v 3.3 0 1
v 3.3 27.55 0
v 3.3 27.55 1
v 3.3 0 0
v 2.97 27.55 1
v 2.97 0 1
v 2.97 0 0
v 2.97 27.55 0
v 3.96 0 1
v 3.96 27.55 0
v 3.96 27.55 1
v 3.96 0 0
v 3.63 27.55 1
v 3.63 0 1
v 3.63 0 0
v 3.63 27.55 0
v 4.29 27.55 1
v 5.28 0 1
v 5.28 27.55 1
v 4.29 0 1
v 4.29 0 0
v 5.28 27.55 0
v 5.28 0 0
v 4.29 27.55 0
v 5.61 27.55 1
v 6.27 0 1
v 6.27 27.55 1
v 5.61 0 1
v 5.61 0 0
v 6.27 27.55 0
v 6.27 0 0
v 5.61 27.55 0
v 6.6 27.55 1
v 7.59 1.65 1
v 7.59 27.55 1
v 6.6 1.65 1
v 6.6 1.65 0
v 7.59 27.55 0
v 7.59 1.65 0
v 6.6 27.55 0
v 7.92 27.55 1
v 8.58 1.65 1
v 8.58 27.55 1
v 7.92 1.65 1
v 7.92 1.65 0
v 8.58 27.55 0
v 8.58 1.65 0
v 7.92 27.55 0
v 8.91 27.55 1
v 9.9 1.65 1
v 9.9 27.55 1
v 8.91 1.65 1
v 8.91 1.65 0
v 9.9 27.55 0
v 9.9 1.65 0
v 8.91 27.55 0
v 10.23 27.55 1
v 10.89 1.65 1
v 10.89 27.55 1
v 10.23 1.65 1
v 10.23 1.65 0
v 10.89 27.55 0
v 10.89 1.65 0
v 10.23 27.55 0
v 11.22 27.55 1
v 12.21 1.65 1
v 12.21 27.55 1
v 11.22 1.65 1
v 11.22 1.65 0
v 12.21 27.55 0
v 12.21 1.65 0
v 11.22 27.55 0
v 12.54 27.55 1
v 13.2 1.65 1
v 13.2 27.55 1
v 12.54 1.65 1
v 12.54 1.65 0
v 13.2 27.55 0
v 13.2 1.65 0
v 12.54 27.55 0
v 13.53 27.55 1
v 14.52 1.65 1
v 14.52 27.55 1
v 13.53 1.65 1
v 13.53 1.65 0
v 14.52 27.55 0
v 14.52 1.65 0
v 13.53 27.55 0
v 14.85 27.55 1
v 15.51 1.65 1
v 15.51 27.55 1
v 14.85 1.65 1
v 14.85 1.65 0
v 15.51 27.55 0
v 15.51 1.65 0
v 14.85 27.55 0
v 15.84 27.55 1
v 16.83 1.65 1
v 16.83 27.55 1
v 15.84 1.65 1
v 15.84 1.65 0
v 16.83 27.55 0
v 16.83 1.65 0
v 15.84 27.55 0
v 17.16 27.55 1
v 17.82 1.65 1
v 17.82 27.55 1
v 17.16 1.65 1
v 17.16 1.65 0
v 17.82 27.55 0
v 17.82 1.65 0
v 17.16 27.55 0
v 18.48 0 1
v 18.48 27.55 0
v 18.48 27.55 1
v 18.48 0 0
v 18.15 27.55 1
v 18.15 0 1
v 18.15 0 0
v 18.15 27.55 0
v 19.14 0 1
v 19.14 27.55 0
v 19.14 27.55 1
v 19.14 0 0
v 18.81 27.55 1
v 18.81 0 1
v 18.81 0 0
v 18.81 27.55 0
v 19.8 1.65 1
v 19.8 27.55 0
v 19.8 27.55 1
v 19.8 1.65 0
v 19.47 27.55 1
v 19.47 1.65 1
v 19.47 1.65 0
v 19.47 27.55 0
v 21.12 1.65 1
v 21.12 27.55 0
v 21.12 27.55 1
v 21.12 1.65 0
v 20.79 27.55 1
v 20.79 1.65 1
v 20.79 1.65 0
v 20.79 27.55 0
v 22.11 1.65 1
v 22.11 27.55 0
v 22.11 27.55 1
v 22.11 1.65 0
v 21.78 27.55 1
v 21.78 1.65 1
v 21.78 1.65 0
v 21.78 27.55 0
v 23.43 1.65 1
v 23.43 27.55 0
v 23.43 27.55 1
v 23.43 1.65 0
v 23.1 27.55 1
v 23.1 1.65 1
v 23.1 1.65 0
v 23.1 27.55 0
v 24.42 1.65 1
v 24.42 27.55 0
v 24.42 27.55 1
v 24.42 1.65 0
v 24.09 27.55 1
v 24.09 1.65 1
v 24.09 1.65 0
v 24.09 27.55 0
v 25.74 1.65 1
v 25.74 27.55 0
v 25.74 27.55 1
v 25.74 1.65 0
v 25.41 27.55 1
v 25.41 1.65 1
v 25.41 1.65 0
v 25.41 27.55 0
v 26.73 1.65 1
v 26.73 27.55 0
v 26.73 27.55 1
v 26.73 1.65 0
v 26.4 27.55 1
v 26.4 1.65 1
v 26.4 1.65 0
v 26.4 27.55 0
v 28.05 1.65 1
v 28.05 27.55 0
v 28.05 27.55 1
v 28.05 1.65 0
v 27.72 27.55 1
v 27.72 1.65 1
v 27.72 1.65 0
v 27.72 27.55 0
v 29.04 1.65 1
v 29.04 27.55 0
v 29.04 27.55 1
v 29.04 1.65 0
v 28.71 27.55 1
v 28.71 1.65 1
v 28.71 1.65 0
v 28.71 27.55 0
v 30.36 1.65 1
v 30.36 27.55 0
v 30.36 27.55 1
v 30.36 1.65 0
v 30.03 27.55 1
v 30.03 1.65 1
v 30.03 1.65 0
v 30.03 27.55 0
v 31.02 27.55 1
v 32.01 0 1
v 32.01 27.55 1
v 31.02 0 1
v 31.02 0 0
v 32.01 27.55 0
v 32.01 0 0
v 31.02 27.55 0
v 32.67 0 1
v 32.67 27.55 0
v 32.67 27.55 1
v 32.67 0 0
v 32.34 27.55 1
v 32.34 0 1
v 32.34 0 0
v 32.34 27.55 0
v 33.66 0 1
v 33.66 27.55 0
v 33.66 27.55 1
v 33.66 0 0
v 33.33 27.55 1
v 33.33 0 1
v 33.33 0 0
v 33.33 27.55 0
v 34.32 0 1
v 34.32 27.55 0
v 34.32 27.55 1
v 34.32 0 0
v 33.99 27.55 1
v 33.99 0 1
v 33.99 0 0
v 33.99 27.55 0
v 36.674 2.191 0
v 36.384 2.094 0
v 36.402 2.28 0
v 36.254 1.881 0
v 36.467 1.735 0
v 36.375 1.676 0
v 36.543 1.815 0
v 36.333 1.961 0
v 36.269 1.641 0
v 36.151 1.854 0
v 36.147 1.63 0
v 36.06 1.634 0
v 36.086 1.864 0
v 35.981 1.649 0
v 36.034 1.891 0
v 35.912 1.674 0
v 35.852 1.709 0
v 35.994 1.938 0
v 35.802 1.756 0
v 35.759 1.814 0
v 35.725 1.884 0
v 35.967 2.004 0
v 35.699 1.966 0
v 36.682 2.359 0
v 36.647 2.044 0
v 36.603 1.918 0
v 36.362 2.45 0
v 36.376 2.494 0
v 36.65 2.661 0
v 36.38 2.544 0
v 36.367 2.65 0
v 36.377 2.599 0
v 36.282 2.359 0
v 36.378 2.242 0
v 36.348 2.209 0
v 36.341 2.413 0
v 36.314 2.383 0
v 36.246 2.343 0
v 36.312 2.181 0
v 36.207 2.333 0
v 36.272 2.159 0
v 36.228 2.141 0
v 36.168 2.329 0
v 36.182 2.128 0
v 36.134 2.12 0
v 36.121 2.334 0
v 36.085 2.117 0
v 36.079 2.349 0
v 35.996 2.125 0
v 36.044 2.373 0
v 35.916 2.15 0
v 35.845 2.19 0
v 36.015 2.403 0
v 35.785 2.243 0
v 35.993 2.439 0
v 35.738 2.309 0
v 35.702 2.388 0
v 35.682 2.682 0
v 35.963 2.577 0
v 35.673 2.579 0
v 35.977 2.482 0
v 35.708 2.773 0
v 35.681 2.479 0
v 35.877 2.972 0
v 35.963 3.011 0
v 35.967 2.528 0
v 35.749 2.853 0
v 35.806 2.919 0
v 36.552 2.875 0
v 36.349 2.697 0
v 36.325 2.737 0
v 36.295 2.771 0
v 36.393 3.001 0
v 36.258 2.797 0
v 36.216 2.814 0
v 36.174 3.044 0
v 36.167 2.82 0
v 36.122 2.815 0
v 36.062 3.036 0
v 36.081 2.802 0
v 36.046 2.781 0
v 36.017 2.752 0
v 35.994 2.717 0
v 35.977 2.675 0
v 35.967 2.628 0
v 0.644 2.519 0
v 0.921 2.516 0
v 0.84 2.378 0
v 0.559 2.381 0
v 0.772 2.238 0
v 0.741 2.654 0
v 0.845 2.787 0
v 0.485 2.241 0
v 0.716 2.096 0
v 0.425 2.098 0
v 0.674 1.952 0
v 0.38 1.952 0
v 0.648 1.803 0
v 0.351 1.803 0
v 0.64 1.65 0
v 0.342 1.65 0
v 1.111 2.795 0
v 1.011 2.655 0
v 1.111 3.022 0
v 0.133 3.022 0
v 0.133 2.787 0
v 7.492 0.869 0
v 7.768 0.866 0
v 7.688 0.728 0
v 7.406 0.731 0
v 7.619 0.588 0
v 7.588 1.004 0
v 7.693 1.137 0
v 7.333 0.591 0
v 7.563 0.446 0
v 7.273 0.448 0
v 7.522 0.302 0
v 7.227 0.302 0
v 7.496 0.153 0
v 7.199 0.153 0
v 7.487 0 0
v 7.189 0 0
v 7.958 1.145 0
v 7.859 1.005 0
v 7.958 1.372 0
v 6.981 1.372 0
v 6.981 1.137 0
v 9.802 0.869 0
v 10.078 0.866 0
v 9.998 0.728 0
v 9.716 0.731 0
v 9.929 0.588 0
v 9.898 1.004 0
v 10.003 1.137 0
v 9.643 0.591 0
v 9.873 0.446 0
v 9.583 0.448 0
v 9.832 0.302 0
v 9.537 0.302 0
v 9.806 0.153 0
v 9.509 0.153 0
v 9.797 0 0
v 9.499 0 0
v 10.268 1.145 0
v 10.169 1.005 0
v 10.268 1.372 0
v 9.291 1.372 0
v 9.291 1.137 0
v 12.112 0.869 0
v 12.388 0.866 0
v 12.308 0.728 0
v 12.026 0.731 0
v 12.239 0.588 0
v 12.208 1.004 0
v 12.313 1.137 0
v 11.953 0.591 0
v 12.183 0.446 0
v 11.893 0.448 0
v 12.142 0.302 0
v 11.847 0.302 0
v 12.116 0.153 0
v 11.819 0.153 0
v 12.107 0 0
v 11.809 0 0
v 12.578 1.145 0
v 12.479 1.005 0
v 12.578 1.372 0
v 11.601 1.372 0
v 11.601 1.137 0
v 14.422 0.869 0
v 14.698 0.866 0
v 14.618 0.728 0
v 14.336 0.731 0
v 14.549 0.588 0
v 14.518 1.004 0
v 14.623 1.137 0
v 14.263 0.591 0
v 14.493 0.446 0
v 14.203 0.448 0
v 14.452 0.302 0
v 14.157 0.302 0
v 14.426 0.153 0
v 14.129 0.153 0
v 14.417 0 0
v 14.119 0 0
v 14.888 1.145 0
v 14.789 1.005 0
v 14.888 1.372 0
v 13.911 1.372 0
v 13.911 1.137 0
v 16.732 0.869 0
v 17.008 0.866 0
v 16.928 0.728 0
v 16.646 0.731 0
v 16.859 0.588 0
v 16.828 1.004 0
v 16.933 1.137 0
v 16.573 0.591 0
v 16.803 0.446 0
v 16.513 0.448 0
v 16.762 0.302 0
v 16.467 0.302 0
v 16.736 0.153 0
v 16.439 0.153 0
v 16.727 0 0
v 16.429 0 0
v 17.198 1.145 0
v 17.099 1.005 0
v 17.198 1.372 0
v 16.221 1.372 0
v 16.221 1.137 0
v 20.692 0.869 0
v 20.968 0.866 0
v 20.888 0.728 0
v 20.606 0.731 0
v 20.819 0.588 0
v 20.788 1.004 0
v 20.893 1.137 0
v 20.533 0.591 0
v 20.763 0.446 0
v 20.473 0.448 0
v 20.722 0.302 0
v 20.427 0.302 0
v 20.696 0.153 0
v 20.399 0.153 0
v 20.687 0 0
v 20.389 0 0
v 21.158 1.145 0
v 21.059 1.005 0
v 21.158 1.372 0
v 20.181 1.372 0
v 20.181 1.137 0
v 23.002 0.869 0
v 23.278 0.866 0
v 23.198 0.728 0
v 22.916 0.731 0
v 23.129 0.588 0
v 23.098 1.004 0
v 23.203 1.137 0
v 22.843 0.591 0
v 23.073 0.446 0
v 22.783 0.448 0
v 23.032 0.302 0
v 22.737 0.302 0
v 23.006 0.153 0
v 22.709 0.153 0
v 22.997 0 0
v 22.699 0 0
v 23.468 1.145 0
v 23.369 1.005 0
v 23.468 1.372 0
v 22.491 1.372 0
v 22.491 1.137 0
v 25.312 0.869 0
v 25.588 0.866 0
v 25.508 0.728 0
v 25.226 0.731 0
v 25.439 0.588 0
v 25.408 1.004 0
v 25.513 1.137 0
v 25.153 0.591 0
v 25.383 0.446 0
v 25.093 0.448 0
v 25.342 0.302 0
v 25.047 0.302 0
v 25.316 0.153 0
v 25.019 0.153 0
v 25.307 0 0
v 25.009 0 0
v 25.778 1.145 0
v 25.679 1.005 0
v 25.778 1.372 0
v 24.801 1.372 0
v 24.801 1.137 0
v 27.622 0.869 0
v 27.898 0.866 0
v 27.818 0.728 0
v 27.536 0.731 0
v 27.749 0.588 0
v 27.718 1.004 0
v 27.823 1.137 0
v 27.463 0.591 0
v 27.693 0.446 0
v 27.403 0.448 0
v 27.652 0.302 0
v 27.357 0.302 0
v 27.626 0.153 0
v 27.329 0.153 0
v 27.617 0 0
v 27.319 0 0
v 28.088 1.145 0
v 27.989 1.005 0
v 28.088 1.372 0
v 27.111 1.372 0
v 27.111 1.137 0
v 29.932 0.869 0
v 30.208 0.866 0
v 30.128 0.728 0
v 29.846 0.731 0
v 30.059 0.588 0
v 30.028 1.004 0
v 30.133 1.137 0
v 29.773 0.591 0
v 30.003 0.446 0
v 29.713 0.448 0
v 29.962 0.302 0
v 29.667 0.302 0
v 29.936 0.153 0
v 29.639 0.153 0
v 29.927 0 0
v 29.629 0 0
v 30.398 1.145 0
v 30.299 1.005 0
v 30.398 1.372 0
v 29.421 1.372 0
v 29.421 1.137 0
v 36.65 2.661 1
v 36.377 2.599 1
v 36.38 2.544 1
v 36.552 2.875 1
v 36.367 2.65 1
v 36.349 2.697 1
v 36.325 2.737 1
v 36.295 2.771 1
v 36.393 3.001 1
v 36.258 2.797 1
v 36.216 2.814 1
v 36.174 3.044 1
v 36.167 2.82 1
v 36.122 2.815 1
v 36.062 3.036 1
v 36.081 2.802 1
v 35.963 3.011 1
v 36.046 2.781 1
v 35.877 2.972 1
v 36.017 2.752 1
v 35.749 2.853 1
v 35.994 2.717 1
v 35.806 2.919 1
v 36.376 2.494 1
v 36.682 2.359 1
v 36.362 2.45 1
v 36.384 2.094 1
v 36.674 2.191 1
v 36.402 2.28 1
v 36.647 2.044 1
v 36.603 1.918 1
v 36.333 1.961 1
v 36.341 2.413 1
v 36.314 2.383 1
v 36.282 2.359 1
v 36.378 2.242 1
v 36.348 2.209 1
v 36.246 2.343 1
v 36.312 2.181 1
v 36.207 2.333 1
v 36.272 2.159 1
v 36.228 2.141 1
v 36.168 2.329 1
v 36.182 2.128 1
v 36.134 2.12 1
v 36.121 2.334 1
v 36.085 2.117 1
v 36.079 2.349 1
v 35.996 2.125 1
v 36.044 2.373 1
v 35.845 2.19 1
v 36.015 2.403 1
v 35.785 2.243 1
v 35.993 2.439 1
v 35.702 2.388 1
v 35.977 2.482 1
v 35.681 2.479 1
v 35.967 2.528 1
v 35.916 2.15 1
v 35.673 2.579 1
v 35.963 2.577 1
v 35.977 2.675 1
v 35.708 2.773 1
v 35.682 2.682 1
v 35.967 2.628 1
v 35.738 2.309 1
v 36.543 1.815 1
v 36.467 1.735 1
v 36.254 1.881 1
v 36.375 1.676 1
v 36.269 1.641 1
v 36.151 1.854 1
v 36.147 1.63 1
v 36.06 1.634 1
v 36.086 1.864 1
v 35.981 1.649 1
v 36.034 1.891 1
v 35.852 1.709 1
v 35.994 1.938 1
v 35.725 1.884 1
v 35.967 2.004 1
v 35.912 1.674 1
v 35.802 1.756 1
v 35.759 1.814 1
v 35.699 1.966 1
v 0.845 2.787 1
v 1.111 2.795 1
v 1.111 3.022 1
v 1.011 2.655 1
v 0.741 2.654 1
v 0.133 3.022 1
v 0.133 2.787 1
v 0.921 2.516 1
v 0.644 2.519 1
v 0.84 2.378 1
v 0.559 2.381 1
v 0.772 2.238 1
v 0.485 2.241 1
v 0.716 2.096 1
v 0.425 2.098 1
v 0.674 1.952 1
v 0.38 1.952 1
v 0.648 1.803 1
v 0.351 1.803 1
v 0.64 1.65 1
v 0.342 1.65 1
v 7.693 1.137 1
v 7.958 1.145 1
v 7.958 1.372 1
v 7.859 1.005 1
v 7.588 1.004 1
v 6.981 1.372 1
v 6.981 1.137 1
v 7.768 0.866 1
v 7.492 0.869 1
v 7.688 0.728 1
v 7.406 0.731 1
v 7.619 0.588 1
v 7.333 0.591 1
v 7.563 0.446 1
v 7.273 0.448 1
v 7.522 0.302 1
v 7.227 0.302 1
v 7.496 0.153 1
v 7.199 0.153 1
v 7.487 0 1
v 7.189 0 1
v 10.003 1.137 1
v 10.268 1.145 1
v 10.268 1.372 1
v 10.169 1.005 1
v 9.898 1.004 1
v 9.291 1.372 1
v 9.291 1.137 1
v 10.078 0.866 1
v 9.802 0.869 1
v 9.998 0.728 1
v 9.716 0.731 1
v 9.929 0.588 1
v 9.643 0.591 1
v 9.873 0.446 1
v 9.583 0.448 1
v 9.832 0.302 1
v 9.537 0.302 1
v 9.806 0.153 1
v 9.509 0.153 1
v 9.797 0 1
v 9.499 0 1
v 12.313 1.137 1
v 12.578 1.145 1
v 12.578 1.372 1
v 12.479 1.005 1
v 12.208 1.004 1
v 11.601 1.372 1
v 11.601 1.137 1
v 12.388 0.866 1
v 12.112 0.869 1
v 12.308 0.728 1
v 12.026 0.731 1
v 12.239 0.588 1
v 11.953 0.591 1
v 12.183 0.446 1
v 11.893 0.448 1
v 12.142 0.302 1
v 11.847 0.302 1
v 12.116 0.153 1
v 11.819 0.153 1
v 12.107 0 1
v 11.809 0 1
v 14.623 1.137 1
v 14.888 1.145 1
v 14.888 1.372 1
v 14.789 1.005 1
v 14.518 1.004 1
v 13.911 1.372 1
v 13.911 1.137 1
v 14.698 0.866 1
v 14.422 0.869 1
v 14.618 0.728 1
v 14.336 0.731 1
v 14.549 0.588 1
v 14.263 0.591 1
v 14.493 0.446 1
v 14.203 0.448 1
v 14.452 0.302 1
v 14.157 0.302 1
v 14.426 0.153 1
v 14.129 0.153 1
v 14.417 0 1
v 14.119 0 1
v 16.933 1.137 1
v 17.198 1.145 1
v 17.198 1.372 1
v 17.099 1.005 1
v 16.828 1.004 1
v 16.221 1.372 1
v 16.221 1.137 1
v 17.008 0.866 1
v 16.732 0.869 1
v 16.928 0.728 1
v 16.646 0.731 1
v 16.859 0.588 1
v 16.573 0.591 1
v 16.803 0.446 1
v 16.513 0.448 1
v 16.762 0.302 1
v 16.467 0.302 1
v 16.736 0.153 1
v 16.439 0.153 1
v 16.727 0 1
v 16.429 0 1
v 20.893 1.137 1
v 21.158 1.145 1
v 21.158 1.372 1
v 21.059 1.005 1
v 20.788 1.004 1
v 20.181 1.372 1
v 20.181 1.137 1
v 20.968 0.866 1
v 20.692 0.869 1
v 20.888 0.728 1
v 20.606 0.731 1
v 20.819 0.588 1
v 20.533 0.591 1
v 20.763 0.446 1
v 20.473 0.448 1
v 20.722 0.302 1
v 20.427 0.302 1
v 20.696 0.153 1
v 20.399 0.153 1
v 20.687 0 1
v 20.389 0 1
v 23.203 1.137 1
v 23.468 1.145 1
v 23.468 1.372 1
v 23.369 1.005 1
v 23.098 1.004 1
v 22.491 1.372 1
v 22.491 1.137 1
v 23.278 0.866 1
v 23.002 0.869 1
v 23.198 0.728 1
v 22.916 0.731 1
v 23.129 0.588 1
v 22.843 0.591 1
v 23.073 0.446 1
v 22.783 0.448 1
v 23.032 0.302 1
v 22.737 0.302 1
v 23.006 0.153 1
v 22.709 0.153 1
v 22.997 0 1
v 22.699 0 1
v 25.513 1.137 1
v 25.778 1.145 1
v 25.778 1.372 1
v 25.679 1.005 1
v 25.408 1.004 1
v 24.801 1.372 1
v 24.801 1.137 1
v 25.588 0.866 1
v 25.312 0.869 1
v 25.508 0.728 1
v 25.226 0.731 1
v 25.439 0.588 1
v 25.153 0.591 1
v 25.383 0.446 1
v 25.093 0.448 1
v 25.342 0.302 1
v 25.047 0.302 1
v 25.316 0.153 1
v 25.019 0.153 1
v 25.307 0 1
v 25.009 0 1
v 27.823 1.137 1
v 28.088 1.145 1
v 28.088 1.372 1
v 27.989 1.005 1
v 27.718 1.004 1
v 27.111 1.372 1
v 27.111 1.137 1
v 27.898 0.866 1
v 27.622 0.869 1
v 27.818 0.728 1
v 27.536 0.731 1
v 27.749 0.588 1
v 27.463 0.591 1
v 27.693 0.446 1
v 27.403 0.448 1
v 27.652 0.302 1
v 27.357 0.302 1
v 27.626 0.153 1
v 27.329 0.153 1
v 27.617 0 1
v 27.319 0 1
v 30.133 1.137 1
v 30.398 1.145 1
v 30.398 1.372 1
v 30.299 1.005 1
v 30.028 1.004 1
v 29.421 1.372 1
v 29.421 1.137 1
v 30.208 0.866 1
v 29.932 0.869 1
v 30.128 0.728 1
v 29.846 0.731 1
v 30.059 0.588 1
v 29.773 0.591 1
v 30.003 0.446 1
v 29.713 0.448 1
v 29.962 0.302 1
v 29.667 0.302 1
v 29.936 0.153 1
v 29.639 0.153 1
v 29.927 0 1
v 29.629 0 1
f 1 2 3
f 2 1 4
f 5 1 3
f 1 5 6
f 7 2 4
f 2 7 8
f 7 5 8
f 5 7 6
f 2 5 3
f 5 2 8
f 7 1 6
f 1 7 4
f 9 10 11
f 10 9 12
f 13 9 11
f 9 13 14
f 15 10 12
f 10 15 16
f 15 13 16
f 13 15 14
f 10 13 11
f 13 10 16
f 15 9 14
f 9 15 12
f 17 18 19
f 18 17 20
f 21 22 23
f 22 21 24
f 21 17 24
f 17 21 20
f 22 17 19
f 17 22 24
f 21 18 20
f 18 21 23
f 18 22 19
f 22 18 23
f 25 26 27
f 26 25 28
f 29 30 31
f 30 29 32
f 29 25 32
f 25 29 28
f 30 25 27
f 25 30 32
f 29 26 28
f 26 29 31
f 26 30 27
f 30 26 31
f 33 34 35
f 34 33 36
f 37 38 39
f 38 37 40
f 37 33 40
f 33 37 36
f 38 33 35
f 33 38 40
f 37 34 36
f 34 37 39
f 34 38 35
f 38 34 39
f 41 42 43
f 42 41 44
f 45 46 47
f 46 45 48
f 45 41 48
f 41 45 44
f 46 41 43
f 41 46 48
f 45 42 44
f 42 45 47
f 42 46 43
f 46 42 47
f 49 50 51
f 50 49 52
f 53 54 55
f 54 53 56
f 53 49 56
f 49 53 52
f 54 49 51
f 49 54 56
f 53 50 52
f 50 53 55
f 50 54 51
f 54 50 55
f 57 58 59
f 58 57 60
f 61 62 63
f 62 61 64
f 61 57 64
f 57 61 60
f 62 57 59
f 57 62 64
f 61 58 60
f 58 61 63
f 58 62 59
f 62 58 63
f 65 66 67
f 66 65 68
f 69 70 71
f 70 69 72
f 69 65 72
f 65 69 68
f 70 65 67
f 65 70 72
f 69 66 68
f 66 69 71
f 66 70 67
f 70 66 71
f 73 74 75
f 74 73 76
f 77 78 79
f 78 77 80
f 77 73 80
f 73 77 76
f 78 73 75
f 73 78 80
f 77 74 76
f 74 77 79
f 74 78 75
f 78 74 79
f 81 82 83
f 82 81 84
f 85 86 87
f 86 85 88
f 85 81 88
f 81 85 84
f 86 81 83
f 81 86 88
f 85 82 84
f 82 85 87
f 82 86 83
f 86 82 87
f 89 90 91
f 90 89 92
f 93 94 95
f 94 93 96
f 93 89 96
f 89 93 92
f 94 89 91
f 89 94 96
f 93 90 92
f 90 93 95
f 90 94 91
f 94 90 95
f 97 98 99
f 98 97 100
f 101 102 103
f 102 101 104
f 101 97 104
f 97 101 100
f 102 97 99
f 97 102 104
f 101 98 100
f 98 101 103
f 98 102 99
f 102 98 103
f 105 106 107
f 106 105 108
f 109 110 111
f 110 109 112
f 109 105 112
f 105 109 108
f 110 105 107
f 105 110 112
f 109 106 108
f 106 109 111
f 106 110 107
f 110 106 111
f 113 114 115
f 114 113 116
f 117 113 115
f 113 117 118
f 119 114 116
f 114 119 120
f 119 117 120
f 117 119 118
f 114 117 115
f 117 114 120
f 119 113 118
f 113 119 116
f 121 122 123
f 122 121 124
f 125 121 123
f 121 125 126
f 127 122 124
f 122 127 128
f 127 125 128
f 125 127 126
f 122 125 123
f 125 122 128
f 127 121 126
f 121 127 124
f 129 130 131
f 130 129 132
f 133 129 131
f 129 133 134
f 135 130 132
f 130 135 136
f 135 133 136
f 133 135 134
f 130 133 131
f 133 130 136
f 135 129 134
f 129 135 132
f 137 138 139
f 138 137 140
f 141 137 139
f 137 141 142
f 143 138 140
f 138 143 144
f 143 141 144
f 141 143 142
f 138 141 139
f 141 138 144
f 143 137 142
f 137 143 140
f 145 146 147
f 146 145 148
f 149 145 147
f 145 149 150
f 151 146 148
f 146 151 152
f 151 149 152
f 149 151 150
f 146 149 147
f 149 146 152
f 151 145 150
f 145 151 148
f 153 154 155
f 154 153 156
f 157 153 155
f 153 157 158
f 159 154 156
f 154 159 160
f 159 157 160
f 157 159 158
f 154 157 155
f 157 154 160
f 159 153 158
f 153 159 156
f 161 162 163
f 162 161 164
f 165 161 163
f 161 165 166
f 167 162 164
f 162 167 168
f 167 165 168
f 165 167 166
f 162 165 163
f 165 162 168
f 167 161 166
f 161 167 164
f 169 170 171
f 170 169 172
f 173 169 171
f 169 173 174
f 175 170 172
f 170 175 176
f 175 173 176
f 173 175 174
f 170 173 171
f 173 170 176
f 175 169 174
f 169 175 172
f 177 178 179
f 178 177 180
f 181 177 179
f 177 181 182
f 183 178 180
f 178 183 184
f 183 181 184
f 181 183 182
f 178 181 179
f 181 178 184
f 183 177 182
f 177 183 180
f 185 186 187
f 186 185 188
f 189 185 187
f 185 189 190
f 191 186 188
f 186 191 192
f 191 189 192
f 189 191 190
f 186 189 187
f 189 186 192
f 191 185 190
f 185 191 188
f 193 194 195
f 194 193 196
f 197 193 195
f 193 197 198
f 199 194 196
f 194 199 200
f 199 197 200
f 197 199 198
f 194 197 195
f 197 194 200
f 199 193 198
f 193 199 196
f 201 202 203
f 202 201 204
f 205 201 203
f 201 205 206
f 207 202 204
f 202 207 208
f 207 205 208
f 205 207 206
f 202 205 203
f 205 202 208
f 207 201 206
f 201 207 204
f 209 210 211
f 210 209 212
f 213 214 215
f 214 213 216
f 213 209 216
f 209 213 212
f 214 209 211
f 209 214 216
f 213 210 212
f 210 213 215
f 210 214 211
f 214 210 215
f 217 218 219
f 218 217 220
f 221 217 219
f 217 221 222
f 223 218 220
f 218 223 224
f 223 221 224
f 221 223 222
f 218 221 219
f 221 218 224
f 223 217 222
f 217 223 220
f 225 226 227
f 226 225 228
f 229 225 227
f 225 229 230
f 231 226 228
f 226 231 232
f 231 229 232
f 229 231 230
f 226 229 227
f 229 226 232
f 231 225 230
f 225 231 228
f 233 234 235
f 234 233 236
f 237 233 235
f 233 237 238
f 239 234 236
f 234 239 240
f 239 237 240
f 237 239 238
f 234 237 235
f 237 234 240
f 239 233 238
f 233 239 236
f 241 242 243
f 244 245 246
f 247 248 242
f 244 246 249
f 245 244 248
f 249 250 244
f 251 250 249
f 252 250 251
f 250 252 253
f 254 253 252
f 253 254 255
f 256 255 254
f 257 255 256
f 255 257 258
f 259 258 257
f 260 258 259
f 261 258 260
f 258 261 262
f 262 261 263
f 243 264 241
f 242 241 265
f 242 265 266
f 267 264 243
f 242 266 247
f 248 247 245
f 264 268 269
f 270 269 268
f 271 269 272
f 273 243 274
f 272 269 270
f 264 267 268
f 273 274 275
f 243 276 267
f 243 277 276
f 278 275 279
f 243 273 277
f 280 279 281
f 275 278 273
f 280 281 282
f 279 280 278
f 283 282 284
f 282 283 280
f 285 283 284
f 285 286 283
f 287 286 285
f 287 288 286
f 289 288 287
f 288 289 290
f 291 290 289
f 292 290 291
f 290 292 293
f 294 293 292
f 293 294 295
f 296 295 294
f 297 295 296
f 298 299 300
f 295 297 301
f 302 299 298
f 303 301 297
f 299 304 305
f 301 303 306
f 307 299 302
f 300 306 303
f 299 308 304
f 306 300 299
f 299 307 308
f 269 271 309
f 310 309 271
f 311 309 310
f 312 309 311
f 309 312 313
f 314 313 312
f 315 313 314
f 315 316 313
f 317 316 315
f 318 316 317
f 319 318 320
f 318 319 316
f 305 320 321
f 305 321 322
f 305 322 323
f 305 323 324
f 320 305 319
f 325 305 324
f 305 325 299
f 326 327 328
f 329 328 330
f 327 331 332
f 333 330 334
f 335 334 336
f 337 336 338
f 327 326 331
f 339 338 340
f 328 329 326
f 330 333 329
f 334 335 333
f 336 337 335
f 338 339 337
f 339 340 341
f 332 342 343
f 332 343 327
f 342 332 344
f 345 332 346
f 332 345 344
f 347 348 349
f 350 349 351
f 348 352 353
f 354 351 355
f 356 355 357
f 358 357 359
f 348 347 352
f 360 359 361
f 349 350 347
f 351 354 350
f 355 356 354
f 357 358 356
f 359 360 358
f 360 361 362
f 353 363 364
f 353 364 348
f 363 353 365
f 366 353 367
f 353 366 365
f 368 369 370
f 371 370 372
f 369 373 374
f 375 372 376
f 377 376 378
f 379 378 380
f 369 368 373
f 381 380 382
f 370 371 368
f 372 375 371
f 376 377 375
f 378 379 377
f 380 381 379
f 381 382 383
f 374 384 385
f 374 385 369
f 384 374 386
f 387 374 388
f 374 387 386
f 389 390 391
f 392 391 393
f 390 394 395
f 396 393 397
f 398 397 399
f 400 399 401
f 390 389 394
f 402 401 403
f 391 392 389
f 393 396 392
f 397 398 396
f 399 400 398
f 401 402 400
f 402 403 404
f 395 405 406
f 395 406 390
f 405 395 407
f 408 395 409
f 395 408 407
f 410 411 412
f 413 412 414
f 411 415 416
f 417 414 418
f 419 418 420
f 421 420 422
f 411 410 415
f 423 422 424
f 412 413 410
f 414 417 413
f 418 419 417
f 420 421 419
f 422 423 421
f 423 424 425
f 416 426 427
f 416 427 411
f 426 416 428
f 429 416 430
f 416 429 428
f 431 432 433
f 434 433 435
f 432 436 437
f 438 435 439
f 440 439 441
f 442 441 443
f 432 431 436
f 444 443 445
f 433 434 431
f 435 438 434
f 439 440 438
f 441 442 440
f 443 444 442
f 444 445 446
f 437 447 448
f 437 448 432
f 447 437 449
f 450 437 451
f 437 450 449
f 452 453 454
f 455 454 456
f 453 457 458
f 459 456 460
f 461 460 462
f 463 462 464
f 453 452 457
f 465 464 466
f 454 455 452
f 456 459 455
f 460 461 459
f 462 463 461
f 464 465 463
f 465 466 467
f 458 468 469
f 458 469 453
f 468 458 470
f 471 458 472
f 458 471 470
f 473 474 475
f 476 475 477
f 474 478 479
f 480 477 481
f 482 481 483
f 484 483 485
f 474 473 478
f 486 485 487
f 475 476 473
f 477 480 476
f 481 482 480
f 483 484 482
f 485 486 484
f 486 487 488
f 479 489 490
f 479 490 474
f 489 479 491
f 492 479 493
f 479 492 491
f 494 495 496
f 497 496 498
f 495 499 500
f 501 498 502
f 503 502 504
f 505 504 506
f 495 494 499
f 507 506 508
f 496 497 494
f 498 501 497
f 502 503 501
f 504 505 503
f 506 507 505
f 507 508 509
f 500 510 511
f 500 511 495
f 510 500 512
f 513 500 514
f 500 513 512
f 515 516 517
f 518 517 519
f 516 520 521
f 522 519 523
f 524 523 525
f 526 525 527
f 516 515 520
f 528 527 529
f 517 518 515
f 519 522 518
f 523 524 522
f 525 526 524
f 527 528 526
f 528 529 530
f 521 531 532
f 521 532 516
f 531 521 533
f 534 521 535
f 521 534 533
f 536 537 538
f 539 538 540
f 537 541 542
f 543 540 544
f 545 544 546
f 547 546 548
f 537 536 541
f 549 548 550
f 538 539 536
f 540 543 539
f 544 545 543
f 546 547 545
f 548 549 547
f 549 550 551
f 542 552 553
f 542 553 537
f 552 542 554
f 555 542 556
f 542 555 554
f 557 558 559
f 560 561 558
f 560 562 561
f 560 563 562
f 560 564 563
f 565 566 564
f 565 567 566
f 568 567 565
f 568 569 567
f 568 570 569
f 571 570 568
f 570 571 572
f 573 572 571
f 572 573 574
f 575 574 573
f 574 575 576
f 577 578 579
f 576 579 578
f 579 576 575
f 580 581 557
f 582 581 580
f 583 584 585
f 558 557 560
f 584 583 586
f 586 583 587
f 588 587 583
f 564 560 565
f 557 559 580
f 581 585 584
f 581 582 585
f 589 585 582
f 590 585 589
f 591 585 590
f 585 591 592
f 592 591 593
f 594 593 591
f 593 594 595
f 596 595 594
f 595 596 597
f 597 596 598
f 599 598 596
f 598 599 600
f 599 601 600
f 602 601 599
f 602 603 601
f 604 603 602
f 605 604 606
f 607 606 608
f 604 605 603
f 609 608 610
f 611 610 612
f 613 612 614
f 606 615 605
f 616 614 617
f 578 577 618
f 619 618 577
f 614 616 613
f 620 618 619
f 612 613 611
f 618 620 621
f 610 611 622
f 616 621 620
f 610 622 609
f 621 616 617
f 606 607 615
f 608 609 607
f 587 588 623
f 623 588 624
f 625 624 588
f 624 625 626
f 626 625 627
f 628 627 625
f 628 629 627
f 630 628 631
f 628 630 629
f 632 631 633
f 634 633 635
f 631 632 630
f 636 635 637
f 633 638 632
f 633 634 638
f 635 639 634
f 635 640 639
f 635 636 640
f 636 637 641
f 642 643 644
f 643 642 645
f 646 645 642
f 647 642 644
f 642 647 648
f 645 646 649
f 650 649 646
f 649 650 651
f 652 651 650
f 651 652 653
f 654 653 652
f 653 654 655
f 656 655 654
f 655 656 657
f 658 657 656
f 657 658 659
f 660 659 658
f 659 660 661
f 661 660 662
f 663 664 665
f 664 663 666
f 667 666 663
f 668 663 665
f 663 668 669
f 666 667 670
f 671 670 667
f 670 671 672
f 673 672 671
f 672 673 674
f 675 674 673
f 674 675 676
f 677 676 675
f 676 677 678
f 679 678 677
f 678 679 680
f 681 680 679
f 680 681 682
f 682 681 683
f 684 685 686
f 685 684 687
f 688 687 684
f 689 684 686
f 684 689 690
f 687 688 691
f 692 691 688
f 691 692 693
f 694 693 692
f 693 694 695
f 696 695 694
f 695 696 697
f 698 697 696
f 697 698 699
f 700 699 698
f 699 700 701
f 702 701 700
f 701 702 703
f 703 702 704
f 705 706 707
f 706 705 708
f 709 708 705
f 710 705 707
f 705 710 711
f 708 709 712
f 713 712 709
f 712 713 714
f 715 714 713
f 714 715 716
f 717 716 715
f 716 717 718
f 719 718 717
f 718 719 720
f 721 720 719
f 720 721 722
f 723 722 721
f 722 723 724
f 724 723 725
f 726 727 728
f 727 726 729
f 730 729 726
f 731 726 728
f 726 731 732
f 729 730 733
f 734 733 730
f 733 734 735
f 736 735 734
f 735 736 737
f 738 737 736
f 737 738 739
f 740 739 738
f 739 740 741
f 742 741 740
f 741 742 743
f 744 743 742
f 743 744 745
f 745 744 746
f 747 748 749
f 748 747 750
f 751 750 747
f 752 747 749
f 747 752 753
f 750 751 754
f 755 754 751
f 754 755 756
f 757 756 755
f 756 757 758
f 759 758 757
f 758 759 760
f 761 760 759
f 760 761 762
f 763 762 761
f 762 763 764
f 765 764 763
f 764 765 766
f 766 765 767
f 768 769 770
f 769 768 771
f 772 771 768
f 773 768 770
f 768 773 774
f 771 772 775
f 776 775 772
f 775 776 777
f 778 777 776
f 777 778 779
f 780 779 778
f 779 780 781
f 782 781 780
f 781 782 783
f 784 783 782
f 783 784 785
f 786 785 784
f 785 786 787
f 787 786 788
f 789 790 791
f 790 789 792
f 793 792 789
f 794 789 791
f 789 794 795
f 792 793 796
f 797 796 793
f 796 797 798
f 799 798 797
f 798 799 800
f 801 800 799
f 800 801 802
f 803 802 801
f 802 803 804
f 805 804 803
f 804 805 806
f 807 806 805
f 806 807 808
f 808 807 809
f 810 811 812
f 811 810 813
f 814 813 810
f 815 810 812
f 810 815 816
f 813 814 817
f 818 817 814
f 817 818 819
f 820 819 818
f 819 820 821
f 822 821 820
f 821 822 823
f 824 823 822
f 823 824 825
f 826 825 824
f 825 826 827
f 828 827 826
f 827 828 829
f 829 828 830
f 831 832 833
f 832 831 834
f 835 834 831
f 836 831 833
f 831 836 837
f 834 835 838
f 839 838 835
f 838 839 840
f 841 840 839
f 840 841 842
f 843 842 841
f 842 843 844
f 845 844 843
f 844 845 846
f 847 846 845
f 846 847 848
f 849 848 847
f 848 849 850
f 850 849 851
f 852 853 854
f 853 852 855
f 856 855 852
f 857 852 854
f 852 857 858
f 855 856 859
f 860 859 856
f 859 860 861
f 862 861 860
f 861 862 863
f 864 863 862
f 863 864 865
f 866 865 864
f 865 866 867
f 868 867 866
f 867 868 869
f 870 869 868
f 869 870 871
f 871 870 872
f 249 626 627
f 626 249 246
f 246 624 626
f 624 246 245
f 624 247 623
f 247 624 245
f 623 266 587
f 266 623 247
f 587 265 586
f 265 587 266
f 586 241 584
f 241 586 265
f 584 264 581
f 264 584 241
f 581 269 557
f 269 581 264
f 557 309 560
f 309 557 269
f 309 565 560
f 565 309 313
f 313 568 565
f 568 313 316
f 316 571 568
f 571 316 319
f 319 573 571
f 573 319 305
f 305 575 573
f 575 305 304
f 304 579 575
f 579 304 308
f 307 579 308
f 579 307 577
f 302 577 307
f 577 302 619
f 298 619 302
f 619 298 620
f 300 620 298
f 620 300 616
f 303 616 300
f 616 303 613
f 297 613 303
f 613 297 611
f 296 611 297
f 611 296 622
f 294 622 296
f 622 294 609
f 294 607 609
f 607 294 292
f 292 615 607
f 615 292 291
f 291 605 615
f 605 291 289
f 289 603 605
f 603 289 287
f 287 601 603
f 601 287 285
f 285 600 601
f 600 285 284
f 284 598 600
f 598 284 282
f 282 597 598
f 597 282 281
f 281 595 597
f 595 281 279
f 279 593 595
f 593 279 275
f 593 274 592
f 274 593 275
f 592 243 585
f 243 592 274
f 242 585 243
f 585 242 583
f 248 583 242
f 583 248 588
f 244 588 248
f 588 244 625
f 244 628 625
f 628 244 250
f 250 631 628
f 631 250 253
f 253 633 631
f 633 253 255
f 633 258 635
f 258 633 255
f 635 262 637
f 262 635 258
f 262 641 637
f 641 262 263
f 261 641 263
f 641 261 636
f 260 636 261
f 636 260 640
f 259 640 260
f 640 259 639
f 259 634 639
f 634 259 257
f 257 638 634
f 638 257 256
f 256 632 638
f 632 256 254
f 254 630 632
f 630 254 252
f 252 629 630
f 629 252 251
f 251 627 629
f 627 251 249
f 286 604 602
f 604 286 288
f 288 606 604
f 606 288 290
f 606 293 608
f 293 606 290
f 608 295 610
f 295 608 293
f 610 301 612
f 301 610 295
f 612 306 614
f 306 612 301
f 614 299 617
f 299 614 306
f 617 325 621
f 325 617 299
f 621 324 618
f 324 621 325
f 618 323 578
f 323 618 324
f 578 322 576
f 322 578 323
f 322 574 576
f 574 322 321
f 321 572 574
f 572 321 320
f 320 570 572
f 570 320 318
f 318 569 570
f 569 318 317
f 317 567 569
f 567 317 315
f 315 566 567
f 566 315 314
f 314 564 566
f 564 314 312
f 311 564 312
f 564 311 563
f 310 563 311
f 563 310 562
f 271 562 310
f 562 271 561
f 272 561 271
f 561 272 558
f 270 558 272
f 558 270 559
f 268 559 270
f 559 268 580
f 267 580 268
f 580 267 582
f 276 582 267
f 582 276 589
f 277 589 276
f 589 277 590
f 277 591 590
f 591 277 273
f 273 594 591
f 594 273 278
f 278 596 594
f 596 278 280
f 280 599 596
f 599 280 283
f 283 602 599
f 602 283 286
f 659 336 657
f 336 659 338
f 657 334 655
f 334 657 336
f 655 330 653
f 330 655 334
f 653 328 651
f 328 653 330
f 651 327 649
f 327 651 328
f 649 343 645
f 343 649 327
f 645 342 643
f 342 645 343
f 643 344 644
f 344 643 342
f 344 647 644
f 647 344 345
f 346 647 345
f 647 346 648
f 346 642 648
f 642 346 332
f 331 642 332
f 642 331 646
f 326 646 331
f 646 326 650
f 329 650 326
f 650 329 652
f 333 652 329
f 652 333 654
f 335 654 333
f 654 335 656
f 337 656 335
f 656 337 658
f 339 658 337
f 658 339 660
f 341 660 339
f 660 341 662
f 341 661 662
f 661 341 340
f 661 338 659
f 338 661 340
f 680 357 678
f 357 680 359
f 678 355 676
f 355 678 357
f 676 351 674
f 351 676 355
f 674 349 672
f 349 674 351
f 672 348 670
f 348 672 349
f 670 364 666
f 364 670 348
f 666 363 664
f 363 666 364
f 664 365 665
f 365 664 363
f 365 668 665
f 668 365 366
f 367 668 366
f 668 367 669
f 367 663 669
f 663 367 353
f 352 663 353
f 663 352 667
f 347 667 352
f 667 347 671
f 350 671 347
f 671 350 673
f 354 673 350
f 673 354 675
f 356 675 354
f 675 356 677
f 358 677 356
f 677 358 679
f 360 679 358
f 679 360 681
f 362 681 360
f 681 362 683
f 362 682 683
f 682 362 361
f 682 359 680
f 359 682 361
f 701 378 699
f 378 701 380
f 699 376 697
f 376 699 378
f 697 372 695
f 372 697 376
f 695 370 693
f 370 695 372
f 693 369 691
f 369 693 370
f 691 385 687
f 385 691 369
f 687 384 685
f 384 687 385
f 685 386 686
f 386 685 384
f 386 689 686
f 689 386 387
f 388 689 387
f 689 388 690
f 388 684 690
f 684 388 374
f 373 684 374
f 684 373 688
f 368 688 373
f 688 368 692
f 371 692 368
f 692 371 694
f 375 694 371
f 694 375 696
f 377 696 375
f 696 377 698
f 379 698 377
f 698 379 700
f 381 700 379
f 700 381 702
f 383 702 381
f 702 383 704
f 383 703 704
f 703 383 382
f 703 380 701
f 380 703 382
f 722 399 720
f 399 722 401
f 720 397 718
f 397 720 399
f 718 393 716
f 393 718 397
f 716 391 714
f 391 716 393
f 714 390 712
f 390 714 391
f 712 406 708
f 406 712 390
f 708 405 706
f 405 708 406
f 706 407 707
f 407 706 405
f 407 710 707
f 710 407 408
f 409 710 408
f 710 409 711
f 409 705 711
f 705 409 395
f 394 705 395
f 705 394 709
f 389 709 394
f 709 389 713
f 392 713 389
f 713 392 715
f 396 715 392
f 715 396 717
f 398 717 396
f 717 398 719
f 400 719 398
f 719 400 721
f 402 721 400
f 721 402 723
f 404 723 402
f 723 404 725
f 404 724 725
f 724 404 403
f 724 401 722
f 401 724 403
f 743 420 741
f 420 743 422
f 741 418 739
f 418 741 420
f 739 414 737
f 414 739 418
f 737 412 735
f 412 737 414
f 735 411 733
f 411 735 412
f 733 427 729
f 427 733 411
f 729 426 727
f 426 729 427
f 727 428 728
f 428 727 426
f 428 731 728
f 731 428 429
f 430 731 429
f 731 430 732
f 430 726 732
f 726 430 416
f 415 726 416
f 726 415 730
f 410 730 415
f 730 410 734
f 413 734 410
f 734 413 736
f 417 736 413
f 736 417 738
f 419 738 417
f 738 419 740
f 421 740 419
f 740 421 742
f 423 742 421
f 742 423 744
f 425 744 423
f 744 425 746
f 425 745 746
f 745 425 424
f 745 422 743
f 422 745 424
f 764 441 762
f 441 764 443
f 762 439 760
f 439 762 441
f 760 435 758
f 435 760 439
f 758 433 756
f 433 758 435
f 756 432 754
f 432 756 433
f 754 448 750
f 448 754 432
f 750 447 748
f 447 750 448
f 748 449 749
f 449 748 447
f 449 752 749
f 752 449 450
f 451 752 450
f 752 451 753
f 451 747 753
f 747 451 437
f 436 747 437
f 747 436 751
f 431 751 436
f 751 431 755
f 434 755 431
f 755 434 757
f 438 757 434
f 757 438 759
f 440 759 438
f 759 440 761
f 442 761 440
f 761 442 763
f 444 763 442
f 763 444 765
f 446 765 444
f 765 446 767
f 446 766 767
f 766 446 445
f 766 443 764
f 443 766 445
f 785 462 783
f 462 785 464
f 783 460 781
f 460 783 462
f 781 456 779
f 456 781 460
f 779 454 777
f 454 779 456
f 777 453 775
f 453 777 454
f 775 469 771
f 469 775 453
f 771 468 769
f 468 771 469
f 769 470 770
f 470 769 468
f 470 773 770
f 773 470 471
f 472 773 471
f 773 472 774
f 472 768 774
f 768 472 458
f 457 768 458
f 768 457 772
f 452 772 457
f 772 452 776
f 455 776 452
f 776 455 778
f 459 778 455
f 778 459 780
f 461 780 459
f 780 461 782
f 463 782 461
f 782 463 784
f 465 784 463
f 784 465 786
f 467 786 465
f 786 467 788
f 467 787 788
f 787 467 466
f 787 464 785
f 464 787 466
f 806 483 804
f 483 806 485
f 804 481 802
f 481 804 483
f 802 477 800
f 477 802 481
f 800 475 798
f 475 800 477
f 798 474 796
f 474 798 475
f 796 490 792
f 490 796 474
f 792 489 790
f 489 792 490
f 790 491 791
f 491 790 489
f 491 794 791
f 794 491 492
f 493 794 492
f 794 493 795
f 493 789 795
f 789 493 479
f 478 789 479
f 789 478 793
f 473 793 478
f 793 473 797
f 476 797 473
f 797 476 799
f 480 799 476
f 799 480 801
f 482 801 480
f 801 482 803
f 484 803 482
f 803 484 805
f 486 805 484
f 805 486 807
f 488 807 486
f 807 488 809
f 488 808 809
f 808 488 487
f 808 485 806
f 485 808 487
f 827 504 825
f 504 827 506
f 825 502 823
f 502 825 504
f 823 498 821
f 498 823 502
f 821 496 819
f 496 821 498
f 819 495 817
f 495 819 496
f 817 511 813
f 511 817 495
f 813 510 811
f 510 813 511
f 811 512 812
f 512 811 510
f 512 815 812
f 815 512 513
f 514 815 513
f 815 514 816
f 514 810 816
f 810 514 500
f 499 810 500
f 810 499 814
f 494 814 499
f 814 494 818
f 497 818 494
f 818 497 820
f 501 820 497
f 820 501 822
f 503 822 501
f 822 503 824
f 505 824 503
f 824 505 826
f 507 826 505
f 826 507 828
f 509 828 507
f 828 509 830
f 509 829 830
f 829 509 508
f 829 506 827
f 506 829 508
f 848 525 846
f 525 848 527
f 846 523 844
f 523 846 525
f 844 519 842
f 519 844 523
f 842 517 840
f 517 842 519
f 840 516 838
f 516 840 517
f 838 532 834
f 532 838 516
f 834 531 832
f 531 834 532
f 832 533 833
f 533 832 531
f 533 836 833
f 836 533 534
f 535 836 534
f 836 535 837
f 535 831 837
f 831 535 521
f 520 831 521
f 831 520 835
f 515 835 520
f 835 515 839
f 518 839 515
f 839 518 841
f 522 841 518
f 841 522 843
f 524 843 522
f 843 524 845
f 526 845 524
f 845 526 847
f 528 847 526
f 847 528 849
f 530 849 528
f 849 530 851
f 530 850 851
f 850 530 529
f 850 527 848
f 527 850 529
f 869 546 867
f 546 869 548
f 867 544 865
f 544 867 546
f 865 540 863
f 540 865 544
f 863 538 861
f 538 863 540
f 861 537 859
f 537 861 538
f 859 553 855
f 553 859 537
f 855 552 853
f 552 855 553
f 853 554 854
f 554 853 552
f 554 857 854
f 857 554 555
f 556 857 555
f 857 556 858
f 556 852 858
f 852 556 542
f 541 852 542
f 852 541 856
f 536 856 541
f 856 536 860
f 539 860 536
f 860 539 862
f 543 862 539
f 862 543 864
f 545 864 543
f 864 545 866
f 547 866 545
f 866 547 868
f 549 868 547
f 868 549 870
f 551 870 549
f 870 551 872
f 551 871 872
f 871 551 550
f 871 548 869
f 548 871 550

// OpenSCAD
// file: ../../util/bitmap.scad
/*****************************************************************************
 * Module Bitmap Library
 * Modules to create bitmaps of unit squares from 1 or 2 dimensional vectors.
 *****************************************************************************
 * Copyright 2017 Chris Baker
 *
 * This program is free software: you can redistribute it and/or modify
 * it under the terms of the GNU Lesser General Public License as published by
 * the Free Software Foundation, either version 3 of the License, or
 * (at your option) any later version.
 *
 * This program is distributed in the hope that it will be useful,
 * but WITHOUT ANY WARRANTY; without even the implied warranty of
 * MERCHANTABILITY or FITNESS FOR A PARTICULAR PURPOSE.  See the
 * GNU Lesser General Public License for more details.
 *
 * You should have received a copy of the GNU Lesser General Public License
 * along with this program.  If not, see <http://www.gnu.org/licenses/>.
 *****************************************************************************
 * Usage:
 * Include this file with the "use" tag.
 * Depends on compat.scad library.
 *
 * API:
 *   1dbitmap(bitmap, center, expansion, vector_mode)
 *   2dbitmap(bitmap, center, expansion, vector_mode)
 *     Generate a 1 or 2-Dimensional field of modules based on the provided
 *     bitmap vector. See Bitmap Vectors below.
 *     The center flag determines whether to center the bitmap on the origin.
 *     The expansion value actually shrinks each cube in the x and y
 *     dimension by the specified amount.
 *     The vector_mode flag determines whether to create 3D solid geometry
 *     (unit cubes) or 2D vector geometry (squares).
 *
 * Bitmap Vectors:
 *   The bitmap vectors primarily provide boolean information.
 *   A module will be placed where these vectors have a postive value and
 *   skipped where they have a negative value. I.E. 0, -1, false, and undef
 *   are all equivalent and result in a skip. 1 and true are equivalent and
 *   result in a placed 1-unit module.
 *   Further, if the value is an integer it will be treated as a height for
 *   the module, allowing z-maps to be created.
 *   If the value is not an integer or boolean, it will be treated as a color
 *   reference. This can be a string or RGBA vector that will be used to
 *   color the module in the OpenSCAD preview window.
 *   In current versions of OpenSCAD, the color has no effect in the rendered
 *   view or STL output.
 *
 * Vector Mode:
 *   Although OpenSCAD supports generating 2D geometry, there are several
 *   caveats:
 *   - 2D and 3D geometry cannot be mixed
 *   - Extruding 2D geometry causes color information to be lost
 *   - All 2D geometry is projected onto the XY plane when rendering
 *   - Rendering also results in loss of color (same as 3D)
 *   - The SVG exporter is somewhat limited:
 *     - The pixel size of the image is hard-coded in the file
 *     - The title of the image is a generic string
 *     - The color selection for stroke and fill is fixed
 *     - The stroke-width is set to a large value that will cause overlap
 *     - The background is transparent
 *     - Only one path element is created with all of the geometry; there is
 *       no easy way to split up the geometry into multiple logical units.
 *     - These issues can mostly be resolved by hand-editing the file:
 *       - Remove or modify the width and height parameters from the svg
 *         element at the top of the file to provide better scaling.
 *       - Edit the title element at the top of the file to change the title.
 *       - Edit the stroke and fill parameters of the path element (these will
 *         probably be at the end of the file).
 *       - Set the stroke-width parameter for the path element to 0.
 *****************************************************************************/
use <compat.scad>

/*
 * 2dbitmap - Turn a 2D vector into a bitmap of cubes
 *
 * bitmap - 2D vector representing where to place each cube
 *          Value can either be boolean, z-height, or color
 * center - center cubes around the origin
 * expansion - size of gap around each pixel (screendoor)
 * vector_mode - create a 2D vector drawing instead of 3D extrusion
 */
module 2dbitmap(bitmap=[[1,0],[0,1]], center=false, expansion=0, vector_mode=false)
{
	ylen=len(bitmap)-1;

	for (y=[0:ylen]) {
		xlen=len(bitmap[y])-1;
		for (x=[0:xlen])
			translate([x-(center?xlen/2:0),ylen-y-(center?ylen/2:0),0])
				if (is_indexable(bitmap[y][x]))
					color(bitmap[y][x])
						if (vector_mode)
							square([1-expansion,1-expansion], center=center);
						else
							cube([1-expansion,1-expansion,1], center=center);
				else
					if (bitmap[y][x])
						if (vector_mode)
							square([1-expansion,1-expansion], center=center);
						else
							cube([1-expansion,1-expansion,clamp_nonnum(bitmap[y][x])], center=center);
	}
}

module 1dbitmap(bitmap=[1,0,1,0,1], center=false, expansion=0, vector_mode=false)
	2dbitmap([bitmap], center, expansion, vector_mode);

/*
 * Examples
 */

// 1D with z-height
translate([10,0,0]) scale([1,10,1])
	1dbitmap(bitmap=[1,1,0,2,0,0,3], expansion=.1);

// 1D with boolean
translate([-20,0,0]) scale([1,10,1])
	1dbitmap(bitmap=[true,false,true,false,true,true]);

// 2D with z-height
scale([2,2,1])
	2dbitmap(bitmap=[[1,0,2,1],[0,3,3,0],[1,1,0,1]],
		center=true);

// 1D with color
translate([0,-10,0]) scale([1,3,1])
	1dbitmap(bitmap=["red","white","blue",[0,0.3,0,0.5]]);

// 1D with color using 2D-vector-mode
translate([-7,-8,0]) scale([1,2])
	1dbitmap(bitmap=["red",0,"blue",0,"green"], vector_mode=true);
translate([-4.5,-10,0]) scale([1,2])
	1dbitmap(bitmap=["red",0,"blue",0,"green"], vector_mode=true, center=true);
// main file
/* Unit Test 15: All 7s (Automatic Checkdigit 9) */
use <../upc.scad>
UPC_A("77777777777");
